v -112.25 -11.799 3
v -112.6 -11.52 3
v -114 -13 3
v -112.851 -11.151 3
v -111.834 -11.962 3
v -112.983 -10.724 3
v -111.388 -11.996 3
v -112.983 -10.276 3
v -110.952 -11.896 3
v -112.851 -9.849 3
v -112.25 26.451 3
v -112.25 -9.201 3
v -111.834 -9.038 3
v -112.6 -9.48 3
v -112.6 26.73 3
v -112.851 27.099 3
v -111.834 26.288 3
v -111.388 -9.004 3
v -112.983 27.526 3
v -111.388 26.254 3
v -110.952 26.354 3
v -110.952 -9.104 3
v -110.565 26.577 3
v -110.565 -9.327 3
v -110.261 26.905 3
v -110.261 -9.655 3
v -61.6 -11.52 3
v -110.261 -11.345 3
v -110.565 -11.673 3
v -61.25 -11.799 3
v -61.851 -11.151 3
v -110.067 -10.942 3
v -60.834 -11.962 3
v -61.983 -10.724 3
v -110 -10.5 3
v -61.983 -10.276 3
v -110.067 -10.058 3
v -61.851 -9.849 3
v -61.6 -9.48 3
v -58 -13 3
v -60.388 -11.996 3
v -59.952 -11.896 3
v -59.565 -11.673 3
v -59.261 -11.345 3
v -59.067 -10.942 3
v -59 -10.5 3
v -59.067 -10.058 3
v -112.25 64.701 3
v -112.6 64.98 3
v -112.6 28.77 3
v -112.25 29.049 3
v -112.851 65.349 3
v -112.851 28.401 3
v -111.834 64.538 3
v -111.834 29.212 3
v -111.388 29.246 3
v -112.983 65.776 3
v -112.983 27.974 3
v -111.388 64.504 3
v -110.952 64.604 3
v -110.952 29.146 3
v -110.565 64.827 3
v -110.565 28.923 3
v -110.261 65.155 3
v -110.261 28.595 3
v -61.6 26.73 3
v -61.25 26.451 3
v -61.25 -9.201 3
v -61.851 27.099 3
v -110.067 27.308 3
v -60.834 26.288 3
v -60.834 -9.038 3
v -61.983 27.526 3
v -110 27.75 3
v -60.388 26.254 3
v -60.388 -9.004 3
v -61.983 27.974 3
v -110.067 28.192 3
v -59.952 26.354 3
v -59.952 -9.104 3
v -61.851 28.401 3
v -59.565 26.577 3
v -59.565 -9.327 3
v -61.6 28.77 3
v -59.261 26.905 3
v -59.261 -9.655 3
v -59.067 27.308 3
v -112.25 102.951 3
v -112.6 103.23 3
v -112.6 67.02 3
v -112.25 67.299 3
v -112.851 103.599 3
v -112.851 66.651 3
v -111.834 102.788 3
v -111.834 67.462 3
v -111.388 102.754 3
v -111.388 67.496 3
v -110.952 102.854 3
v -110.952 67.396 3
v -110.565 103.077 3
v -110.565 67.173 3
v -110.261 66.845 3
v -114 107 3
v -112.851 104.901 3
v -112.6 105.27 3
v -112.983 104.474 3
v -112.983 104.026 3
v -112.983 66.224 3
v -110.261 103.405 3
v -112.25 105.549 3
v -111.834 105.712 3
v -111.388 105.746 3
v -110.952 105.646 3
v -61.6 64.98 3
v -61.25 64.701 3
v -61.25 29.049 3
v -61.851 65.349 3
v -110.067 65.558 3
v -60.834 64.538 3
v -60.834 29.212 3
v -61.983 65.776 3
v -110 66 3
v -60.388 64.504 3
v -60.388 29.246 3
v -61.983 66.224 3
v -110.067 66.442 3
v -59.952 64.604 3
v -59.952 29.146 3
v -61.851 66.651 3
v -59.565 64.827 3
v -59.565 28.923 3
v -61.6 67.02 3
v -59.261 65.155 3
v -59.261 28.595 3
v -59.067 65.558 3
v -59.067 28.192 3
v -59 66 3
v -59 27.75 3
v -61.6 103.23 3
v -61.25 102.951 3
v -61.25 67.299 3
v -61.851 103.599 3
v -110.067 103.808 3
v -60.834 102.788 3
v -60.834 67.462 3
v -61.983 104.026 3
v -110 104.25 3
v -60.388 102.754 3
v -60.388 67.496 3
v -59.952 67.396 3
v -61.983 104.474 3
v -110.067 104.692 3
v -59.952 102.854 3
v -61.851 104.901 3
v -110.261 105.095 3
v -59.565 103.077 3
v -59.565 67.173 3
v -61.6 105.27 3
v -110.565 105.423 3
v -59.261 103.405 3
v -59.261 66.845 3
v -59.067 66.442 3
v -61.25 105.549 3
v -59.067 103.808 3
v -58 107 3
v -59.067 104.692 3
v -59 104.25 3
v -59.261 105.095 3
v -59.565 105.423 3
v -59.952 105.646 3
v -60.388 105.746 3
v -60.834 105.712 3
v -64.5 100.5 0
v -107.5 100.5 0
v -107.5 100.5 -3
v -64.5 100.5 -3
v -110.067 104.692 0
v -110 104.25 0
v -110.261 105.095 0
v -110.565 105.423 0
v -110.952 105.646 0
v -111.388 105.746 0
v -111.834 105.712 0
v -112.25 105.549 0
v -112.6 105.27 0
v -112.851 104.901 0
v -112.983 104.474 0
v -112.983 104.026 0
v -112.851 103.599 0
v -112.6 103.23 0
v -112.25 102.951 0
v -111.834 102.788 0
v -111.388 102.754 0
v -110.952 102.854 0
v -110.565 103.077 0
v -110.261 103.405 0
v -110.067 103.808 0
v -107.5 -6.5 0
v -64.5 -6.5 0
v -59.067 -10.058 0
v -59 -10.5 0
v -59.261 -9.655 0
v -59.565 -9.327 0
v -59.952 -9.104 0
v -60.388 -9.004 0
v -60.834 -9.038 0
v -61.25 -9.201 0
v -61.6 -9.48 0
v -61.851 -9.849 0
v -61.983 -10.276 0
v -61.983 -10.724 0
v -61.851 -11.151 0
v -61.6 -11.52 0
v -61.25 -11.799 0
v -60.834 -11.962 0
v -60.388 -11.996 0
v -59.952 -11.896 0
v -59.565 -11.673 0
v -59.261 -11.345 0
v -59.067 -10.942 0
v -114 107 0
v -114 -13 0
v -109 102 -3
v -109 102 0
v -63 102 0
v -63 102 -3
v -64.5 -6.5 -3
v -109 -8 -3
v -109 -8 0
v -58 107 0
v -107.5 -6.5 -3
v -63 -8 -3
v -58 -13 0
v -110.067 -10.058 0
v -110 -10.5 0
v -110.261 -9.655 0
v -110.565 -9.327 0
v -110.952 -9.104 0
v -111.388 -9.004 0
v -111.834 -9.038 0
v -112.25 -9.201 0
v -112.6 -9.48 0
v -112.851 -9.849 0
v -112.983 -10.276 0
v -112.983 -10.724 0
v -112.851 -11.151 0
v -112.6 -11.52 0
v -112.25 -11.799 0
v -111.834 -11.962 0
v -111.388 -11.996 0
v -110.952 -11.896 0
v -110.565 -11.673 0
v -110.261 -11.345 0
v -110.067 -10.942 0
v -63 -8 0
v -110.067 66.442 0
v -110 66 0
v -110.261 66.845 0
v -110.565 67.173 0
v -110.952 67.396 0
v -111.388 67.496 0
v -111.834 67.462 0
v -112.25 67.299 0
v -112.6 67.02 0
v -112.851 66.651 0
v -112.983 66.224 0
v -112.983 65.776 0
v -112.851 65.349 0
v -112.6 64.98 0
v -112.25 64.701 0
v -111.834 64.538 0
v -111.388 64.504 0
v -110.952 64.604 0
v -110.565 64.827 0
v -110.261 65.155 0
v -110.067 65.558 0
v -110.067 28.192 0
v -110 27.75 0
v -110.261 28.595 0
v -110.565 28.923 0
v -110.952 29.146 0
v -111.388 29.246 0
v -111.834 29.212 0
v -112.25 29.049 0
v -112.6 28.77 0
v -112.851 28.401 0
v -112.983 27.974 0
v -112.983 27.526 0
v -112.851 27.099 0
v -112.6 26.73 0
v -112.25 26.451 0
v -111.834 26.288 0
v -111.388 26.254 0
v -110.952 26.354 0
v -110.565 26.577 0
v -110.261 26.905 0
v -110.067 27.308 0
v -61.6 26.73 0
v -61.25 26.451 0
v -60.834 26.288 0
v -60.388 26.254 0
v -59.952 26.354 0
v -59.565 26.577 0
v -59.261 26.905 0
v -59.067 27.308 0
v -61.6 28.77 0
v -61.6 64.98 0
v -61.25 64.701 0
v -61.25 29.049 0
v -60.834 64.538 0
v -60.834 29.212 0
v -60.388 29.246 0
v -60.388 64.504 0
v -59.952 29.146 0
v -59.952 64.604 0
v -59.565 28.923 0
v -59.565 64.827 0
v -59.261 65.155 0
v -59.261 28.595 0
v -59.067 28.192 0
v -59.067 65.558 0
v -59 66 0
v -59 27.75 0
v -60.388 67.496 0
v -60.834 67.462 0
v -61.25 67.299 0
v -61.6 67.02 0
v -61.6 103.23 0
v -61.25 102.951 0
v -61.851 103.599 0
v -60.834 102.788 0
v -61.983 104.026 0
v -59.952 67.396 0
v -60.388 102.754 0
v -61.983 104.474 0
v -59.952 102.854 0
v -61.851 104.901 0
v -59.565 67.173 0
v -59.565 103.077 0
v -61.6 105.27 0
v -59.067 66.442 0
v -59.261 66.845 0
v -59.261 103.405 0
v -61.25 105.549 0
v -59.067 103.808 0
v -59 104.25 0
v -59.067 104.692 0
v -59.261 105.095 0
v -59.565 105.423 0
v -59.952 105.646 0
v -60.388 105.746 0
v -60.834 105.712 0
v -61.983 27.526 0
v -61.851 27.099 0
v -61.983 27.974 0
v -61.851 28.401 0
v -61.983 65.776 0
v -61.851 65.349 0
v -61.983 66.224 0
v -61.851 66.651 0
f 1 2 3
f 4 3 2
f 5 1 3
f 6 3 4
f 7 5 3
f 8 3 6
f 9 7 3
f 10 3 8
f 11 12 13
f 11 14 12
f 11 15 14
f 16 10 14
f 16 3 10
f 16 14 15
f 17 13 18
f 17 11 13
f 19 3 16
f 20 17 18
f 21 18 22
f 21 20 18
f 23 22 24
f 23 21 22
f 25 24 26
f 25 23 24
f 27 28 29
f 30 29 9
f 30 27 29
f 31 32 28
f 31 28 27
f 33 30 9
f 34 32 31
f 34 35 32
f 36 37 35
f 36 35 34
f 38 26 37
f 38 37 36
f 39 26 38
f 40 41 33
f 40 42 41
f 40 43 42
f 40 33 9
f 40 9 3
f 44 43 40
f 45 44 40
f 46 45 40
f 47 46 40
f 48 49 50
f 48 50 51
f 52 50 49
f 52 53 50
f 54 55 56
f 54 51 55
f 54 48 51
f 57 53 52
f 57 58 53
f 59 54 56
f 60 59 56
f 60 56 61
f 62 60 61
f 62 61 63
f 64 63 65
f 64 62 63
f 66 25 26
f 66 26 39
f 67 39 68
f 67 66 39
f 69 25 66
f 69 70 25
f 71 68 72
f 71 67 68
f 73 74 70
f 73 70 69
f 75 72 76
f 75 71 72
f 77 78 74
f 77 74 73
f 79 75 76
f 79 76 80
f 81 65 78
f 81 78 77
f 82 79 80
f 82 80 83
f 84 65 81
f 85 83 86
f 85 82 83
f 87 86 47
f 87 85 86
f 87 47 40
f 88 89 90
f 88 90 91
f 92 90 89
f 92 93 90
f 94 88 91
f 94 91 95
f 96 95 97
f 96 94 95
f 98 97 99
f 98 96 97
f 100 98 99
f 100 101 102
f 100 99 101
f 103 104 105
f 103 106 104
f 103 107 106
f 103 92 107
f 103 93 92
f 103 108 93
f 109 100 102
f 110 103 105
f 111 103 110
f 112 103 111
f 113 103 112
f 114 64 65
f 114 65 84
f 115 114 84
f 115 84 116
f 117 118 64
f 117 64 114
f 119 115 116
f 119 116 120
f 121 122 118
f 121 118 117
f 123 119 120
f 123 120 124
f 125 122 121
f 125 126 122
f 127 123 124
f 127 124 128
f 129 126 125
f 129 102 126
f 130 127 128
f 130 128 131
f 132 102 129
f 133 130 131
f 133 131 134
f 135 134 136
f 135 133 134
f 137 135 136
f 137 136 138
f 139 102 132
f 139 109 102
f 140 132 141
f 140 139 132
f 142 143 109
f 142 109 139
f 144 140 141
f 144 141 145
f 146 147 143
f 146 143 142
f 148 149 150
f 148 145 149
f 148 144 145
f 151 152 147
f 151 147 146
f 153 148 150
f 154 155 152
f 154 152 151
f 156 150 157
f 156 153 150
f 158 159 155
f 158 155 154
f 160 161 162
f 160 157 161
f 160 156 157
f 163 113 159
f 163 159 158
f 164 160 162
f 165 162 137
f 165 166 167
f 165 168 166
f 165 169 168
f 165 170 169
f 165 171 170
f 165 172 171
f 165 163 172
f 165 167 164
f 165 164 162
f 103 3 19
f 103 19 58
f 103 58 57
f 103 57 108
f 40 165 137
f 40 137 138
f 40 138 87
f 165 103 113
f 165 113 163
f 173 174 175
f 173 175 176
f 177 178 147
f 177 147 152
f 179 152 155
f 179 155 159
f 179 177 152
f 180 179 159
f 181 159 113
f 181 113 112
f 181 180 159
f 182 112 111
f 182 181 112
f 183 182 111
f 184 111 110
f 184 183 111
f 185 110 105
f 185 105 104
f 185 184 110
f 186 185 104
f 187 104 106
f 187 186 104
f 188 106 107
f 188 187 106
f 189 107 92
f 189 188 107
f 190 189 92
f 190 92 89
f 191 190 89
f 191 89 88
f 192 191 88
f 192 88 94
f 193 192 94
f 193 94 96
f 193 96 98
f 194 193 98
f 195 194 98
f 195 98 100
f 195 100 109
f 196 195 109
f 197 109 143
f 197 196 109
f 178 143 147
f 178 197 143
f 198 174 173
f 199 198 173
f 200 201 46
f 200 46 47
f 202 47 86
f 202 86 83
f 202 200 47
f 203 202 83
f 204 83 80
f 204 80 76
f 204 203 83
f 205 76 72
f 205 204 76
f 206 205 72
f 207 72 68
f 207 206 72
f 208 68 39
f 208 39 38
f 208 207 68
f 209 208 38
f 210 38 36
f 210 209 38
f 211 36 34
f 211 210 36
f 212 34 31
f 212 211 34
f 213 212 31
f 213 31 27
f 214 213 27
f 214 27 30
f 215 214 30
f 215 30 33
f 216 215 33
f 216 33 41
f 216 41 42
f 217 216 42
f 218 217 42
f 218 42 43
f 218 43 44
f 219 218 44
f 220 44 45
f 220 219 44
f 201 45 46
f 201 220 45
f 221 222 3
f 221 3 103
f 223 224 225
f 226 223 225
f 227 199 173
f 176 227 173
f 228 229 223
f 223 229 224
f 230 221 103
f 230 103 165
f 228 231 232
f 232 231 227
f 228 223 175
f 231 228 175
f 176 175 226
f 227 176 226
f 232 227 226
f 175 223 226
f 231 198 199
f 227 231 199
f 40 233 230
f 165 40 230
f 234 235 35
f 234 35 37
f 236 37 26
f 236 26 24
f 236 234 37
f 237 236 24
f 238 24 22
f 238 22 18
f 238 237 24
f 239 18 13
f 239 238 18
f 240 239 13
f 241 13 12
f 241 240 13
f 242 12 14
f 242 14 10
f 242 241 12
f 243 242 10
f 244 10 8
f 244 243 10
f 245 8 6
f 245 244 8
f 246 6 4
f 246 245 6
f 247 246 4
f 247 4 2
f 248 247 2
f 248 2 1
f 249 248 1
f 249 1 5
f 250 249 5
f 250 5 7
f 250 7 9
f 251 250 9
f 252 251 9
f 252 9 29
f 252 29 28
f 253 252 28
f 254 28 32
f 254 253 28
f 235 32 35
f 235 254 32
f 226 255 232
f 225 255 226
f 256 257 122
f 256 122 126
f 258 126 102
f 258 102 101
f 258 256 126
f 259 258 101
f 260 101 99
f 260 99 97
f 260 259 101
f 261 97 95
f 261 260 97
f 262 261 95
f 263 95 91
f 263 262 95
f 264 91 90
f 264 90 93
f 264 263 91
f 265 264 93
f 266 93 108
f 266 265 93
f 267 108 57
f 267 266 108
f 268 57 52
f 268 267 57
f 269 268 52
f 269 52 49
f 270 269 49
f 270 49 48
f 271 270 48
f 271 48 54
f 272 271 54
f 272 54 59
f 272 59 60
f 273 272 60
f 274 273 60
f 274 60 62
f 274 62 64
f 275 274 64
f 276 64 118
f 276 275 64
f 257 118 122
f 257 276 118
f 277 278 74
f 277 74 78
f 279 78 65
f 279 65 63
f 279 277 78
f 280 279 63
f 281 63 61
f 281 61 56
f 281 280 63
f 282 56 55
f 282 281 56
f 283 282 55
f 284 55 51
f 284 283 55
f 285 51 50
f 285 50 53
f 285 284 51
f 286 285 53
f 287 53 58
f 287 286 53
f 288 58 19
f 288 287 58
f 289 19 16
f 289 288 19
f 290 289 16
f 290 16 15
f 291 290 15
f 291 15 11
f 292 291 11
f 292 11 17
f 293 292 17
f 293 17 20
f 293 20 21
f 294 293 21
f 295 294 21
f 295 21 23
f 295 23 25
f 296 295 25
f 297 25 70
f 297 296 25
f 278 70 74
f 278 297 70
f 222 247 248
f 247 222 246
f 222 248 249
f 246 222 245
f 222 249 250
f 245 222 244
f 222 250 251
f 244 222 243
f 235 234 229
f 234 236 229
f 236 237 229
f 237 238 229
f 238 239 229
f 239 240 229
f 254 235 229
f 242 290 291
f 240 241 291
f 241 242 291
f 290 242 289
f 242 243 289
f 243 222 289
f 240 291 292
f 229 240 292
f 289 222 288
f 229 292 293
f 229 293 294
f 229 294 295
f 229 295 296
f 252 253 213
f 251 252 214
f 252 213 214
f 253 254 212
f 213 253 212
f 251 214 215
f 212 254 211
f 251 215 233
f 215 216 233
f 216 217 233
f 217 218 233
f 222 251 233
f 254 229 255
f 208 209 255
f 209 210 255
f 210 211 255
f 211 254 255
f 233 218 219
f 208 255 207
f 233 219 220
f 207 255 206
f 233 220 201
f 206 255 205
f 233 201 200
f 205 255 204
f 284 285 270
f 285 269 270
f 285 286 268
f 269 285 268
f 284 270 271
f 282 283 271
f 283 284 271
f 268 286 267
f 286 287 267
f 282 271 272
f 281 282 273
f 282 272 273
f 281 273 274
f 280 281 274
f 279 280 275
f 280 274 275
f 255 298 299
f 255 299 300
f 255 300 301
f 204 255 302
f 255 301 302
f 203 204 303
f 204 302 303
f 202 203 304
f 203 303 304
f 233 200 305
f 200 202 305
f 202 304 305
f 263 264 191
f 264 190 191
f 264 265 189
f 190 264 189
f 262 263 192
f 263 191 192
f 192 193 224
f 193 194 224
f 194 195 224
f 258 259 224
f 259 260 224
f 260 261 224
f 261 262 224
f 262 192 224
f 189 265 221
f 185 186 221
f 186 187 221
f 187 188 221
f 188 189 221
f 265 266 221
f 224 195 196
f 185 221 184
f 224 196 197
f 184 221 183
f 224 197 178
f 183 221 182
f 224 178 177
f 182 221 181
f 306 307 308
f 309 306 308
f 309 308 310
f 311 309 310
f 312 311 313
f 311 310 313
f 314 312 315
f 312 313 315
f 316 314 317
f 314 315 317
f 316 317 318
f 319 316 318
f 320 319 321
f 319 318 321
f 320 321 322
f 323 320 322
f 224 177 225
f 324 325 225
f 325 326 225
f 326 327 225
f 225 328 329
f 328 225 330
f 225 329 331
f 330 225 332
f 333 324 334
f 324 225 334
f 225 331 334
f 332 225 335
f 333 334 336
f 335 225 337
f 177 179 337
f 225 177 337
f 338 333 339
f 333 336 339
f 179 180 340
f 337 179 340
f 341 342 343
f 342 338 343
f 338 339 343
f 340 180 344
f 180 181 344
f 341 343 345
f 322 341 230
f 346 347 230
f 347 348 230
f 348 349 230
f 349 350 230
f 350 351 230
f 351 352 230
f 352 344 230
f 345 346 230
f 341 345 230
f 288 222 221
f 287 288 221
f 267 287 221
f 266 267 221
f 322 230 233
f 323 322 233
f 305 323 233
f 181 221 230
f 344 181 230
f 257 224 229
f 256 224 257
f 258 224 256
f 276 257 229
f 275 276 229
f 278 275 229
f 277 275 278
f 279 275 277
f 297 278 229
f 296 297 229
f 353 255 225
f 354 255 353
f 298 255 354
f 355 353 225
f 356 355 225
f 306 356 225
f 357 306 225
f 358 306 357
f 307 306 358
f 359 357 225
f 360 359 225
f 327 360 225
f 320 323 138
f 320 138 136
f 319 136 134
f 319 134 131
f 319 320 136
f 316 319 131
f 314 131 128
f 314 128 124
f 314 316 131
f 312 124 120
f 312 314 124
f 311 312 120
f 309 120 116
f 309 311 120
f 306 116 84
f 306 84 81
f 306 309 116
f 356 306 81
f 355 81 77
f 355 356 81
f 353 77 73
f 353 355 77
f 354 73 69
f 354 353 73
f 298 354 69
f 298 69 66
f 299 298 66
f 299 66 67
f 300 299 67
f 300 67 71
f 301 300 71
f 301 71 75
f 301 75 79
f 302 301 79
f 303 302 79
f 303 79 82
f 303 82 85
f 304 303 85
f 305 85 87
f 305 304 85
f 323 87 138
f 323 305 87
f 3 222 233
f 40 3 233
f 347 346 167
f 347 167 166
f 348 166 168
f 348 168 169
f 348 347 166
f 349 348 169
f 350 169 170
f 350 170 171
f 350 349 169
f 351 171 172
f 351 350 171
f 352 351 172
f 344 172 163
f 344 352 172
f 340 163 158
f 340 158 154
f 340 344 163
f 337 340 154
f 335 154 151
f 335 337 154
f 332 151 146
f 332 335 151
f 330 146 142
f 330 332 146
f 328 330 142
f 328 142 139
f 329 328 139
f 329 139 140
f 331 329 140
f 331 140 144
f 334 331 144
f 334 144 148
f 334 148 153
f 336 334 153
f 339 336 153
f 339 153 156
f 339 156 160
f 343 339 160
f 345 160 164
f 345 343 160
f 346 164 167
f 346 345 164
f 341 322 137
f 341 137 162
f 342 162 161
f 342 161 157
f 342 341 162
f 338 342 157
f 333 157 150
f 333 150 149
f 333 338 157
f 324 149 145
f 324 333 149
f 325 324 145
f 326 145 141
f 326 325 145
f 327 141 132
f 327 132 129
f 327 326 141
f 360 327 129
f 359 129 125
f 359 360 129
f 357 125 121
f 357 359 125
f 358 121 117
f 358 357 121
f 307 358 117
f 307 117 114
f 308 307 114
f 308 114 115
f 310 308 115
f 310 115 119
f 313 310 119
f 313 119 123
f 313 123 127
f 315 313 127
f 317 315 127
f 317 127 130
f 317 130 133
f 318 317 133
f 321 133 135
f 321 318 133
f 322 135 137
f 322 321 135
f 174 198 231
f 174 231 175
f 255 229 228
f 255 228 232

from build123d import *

# Parameters (mm, degrees)
SKICA1_W                = 56
SKICA1_H                = 120
SKICA1_R                = 1.5
P_IDAT_VYSUNUT_M1_DEPTH = 3
SKICA2_W                = 46
SKICA2_H                = 110
SKICA2_W_2              = 43
SKICA2_H_2              = 107
P_IDAT_VYSUNUT_M2_DEPTH = 6


with BuildPart() as part:
    # Skica1 → Přidat vysunutím1 (new body)
    with BuildSketch(Plane.XY):
        with Locations((-86, 47)):
            Rectangle(SKICA1_W, SKICA1_H)
        with Locations((-60.5, -10.5)):
            Circle(SKICA1_R, mode=Mode.SUBTRACT)
        with Locations((-111.5, -10.5)):
            Circle(SKICA1_R, mode=Mode.SUBTRACT)
        with Locations((-111.5, 27.75)):
            Circle(SKICA1_R, mode=Mode.SUBTRACT)
        with Locations((-111.5, 66)):
            Circle(SKICA1_R, mode=Mode.SUBTRACT)
        with Locations((-111.5, 104.25)):
            Circle(SKICA1_R, mode=Mode.SUBTRACT)
        with Locations((-60.5, 27.75)):
            Circle(SKICA1_R, mode=Mode.SUBTRACT)
        with Locations((-60.5, 66)):
            Circle(SKICA1_R, mode=Mode.SUBTRACT)
        with Locations((-60.5, 104.25)):
            Circle(SKICA1_R, mode=Mode.SUBTRACT)
    extrude(amount=P_IDAT_VYSUNUT_M1_DEPTH)

    # Skica2 → Přidat vysunutím2 (add)
    with BuildSketch(Plane.XY.offset(3)):
        with Locations((-86, 47)):
            Rectangle(SKICA2_W, SKICA2_H)
        with Locations((-86, 47)):
            Rectangle(SKICA2_W_2, SKICA2_H_2, mode=Mode.SUBTRACT)
    extrude(amount=-P_IDAT_VYSUNUT_M2_DEPTH)


solid = part.part
